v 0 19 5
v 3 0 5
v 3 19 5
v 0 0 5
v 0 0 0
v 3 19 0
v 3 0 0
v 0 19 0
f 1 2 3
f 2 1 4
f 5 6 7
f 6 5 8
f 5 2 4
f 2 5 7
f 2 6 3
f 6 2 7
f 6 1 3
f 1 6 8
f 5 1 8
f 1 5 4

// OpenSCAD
// Generated by SolidPython 1.0.1 on 2020-07-29 00:46:54


cube(size = [3, 19, 5]);
/***********************************************
*********      SolidPython code:      **********
************************************************
 
# import packages: SolidPython
from solid import *
from solid.utils import *
from itertools import chain, combinations, permutations


class Resize:

    def __init__(self, scad_file):
        self.scad_file = scad_file
        #self.scad_file = import_scad(scad_file)
        # cone/cylinder param:
        self.r1 = 0
        self.r2 = 0
        self.h = 0
        # rectangular prism param:
        self.w = 0
        self.l = 0
        # ellipse param:
        self.r = 0

    # import OpenScad code (file name corresponds to shape)


    # classify shape + parameters
    def assign(self, param1, param2, param3):
        if self.scad_file == 'cone.scad':
            self.r1 = param1
            self.r2 = param2
            self.h = param3
        elif self.scad_file == 'cylinder.scad':
            self.r1 = param1
            self.r2 = param2
            self.h = param3
        elif self.scad_file == 'rectangularPrism.scad':
            self.h = param1
            self.l = param2
            self.w = param3
        else:
            self.r = param1
            self.h = param2

    # resize parameters
    def iterate(self):
        x = range(3, 20, 2)
        i = 1
        if self.scad_file == 'cone.scad':
            tempList = list(permutations(x, 2))
            for temp in tempList:
                param1 = temp[0]
                param2 = temp[1]
                filepath = 'produced_scad_files/' + 'cone' + str(param1) + '_' + str(param2) + '_' + '.scad'
                scad_render_to_file(cylinder(h=param1, r1=param2, r2=0), filepath)

        elif self.scad_file == 'cylinder.scad':
            tempList = list(permutations(x, 3))
            for temp in tempList:
                param1 = temp[0]
                param2 = temp[1]
                filepath = 'produced_scad_files/' + 'cylinder' + str(param1) + '_' + str(param2) + '_' + '.scad'
                scad_render_to_file(cylinder(h=param1, r1=param2, r2=param2), filepath)

        elif self.scad_file == 'rectangularPrism.scad':
            tempList = list(permutations(x, 3))
            for temp in tempList:
                param1 = temp[0]
                param2 = temp[1]
                param3 = temp[2]
                filepath = 'produced_scad_files/' + 'rectangularPrism' + str(param1) + '_' + str(param2) + '_' + str(
                    param3) + '.scad'
                scad_render_to_file(cube(size=(param1, param2, param3)), filepath)

        elif self.scad_file == 'ellipse.scad':
            tempList = list(permutations(x, 4))
            for temp in tempList:
                param1 = temp[0]
                param2 = temp[1]
                param3 = temp[2]
                param4 = temp[3]
                filepath = 'produced_scad_files/' + 'ellipse' + str(param1) + '_' + str(param2) + '_' + str(param3) + '_' + str(param4) + '.scad'
                scad_render_to_file(scale([param1, param2, param3])(sphere(r=param4)), filepath)

    def render_to_scadfile(self):
        scad_render_to_file(scad, 'example.scad') 
 
************************************************/
